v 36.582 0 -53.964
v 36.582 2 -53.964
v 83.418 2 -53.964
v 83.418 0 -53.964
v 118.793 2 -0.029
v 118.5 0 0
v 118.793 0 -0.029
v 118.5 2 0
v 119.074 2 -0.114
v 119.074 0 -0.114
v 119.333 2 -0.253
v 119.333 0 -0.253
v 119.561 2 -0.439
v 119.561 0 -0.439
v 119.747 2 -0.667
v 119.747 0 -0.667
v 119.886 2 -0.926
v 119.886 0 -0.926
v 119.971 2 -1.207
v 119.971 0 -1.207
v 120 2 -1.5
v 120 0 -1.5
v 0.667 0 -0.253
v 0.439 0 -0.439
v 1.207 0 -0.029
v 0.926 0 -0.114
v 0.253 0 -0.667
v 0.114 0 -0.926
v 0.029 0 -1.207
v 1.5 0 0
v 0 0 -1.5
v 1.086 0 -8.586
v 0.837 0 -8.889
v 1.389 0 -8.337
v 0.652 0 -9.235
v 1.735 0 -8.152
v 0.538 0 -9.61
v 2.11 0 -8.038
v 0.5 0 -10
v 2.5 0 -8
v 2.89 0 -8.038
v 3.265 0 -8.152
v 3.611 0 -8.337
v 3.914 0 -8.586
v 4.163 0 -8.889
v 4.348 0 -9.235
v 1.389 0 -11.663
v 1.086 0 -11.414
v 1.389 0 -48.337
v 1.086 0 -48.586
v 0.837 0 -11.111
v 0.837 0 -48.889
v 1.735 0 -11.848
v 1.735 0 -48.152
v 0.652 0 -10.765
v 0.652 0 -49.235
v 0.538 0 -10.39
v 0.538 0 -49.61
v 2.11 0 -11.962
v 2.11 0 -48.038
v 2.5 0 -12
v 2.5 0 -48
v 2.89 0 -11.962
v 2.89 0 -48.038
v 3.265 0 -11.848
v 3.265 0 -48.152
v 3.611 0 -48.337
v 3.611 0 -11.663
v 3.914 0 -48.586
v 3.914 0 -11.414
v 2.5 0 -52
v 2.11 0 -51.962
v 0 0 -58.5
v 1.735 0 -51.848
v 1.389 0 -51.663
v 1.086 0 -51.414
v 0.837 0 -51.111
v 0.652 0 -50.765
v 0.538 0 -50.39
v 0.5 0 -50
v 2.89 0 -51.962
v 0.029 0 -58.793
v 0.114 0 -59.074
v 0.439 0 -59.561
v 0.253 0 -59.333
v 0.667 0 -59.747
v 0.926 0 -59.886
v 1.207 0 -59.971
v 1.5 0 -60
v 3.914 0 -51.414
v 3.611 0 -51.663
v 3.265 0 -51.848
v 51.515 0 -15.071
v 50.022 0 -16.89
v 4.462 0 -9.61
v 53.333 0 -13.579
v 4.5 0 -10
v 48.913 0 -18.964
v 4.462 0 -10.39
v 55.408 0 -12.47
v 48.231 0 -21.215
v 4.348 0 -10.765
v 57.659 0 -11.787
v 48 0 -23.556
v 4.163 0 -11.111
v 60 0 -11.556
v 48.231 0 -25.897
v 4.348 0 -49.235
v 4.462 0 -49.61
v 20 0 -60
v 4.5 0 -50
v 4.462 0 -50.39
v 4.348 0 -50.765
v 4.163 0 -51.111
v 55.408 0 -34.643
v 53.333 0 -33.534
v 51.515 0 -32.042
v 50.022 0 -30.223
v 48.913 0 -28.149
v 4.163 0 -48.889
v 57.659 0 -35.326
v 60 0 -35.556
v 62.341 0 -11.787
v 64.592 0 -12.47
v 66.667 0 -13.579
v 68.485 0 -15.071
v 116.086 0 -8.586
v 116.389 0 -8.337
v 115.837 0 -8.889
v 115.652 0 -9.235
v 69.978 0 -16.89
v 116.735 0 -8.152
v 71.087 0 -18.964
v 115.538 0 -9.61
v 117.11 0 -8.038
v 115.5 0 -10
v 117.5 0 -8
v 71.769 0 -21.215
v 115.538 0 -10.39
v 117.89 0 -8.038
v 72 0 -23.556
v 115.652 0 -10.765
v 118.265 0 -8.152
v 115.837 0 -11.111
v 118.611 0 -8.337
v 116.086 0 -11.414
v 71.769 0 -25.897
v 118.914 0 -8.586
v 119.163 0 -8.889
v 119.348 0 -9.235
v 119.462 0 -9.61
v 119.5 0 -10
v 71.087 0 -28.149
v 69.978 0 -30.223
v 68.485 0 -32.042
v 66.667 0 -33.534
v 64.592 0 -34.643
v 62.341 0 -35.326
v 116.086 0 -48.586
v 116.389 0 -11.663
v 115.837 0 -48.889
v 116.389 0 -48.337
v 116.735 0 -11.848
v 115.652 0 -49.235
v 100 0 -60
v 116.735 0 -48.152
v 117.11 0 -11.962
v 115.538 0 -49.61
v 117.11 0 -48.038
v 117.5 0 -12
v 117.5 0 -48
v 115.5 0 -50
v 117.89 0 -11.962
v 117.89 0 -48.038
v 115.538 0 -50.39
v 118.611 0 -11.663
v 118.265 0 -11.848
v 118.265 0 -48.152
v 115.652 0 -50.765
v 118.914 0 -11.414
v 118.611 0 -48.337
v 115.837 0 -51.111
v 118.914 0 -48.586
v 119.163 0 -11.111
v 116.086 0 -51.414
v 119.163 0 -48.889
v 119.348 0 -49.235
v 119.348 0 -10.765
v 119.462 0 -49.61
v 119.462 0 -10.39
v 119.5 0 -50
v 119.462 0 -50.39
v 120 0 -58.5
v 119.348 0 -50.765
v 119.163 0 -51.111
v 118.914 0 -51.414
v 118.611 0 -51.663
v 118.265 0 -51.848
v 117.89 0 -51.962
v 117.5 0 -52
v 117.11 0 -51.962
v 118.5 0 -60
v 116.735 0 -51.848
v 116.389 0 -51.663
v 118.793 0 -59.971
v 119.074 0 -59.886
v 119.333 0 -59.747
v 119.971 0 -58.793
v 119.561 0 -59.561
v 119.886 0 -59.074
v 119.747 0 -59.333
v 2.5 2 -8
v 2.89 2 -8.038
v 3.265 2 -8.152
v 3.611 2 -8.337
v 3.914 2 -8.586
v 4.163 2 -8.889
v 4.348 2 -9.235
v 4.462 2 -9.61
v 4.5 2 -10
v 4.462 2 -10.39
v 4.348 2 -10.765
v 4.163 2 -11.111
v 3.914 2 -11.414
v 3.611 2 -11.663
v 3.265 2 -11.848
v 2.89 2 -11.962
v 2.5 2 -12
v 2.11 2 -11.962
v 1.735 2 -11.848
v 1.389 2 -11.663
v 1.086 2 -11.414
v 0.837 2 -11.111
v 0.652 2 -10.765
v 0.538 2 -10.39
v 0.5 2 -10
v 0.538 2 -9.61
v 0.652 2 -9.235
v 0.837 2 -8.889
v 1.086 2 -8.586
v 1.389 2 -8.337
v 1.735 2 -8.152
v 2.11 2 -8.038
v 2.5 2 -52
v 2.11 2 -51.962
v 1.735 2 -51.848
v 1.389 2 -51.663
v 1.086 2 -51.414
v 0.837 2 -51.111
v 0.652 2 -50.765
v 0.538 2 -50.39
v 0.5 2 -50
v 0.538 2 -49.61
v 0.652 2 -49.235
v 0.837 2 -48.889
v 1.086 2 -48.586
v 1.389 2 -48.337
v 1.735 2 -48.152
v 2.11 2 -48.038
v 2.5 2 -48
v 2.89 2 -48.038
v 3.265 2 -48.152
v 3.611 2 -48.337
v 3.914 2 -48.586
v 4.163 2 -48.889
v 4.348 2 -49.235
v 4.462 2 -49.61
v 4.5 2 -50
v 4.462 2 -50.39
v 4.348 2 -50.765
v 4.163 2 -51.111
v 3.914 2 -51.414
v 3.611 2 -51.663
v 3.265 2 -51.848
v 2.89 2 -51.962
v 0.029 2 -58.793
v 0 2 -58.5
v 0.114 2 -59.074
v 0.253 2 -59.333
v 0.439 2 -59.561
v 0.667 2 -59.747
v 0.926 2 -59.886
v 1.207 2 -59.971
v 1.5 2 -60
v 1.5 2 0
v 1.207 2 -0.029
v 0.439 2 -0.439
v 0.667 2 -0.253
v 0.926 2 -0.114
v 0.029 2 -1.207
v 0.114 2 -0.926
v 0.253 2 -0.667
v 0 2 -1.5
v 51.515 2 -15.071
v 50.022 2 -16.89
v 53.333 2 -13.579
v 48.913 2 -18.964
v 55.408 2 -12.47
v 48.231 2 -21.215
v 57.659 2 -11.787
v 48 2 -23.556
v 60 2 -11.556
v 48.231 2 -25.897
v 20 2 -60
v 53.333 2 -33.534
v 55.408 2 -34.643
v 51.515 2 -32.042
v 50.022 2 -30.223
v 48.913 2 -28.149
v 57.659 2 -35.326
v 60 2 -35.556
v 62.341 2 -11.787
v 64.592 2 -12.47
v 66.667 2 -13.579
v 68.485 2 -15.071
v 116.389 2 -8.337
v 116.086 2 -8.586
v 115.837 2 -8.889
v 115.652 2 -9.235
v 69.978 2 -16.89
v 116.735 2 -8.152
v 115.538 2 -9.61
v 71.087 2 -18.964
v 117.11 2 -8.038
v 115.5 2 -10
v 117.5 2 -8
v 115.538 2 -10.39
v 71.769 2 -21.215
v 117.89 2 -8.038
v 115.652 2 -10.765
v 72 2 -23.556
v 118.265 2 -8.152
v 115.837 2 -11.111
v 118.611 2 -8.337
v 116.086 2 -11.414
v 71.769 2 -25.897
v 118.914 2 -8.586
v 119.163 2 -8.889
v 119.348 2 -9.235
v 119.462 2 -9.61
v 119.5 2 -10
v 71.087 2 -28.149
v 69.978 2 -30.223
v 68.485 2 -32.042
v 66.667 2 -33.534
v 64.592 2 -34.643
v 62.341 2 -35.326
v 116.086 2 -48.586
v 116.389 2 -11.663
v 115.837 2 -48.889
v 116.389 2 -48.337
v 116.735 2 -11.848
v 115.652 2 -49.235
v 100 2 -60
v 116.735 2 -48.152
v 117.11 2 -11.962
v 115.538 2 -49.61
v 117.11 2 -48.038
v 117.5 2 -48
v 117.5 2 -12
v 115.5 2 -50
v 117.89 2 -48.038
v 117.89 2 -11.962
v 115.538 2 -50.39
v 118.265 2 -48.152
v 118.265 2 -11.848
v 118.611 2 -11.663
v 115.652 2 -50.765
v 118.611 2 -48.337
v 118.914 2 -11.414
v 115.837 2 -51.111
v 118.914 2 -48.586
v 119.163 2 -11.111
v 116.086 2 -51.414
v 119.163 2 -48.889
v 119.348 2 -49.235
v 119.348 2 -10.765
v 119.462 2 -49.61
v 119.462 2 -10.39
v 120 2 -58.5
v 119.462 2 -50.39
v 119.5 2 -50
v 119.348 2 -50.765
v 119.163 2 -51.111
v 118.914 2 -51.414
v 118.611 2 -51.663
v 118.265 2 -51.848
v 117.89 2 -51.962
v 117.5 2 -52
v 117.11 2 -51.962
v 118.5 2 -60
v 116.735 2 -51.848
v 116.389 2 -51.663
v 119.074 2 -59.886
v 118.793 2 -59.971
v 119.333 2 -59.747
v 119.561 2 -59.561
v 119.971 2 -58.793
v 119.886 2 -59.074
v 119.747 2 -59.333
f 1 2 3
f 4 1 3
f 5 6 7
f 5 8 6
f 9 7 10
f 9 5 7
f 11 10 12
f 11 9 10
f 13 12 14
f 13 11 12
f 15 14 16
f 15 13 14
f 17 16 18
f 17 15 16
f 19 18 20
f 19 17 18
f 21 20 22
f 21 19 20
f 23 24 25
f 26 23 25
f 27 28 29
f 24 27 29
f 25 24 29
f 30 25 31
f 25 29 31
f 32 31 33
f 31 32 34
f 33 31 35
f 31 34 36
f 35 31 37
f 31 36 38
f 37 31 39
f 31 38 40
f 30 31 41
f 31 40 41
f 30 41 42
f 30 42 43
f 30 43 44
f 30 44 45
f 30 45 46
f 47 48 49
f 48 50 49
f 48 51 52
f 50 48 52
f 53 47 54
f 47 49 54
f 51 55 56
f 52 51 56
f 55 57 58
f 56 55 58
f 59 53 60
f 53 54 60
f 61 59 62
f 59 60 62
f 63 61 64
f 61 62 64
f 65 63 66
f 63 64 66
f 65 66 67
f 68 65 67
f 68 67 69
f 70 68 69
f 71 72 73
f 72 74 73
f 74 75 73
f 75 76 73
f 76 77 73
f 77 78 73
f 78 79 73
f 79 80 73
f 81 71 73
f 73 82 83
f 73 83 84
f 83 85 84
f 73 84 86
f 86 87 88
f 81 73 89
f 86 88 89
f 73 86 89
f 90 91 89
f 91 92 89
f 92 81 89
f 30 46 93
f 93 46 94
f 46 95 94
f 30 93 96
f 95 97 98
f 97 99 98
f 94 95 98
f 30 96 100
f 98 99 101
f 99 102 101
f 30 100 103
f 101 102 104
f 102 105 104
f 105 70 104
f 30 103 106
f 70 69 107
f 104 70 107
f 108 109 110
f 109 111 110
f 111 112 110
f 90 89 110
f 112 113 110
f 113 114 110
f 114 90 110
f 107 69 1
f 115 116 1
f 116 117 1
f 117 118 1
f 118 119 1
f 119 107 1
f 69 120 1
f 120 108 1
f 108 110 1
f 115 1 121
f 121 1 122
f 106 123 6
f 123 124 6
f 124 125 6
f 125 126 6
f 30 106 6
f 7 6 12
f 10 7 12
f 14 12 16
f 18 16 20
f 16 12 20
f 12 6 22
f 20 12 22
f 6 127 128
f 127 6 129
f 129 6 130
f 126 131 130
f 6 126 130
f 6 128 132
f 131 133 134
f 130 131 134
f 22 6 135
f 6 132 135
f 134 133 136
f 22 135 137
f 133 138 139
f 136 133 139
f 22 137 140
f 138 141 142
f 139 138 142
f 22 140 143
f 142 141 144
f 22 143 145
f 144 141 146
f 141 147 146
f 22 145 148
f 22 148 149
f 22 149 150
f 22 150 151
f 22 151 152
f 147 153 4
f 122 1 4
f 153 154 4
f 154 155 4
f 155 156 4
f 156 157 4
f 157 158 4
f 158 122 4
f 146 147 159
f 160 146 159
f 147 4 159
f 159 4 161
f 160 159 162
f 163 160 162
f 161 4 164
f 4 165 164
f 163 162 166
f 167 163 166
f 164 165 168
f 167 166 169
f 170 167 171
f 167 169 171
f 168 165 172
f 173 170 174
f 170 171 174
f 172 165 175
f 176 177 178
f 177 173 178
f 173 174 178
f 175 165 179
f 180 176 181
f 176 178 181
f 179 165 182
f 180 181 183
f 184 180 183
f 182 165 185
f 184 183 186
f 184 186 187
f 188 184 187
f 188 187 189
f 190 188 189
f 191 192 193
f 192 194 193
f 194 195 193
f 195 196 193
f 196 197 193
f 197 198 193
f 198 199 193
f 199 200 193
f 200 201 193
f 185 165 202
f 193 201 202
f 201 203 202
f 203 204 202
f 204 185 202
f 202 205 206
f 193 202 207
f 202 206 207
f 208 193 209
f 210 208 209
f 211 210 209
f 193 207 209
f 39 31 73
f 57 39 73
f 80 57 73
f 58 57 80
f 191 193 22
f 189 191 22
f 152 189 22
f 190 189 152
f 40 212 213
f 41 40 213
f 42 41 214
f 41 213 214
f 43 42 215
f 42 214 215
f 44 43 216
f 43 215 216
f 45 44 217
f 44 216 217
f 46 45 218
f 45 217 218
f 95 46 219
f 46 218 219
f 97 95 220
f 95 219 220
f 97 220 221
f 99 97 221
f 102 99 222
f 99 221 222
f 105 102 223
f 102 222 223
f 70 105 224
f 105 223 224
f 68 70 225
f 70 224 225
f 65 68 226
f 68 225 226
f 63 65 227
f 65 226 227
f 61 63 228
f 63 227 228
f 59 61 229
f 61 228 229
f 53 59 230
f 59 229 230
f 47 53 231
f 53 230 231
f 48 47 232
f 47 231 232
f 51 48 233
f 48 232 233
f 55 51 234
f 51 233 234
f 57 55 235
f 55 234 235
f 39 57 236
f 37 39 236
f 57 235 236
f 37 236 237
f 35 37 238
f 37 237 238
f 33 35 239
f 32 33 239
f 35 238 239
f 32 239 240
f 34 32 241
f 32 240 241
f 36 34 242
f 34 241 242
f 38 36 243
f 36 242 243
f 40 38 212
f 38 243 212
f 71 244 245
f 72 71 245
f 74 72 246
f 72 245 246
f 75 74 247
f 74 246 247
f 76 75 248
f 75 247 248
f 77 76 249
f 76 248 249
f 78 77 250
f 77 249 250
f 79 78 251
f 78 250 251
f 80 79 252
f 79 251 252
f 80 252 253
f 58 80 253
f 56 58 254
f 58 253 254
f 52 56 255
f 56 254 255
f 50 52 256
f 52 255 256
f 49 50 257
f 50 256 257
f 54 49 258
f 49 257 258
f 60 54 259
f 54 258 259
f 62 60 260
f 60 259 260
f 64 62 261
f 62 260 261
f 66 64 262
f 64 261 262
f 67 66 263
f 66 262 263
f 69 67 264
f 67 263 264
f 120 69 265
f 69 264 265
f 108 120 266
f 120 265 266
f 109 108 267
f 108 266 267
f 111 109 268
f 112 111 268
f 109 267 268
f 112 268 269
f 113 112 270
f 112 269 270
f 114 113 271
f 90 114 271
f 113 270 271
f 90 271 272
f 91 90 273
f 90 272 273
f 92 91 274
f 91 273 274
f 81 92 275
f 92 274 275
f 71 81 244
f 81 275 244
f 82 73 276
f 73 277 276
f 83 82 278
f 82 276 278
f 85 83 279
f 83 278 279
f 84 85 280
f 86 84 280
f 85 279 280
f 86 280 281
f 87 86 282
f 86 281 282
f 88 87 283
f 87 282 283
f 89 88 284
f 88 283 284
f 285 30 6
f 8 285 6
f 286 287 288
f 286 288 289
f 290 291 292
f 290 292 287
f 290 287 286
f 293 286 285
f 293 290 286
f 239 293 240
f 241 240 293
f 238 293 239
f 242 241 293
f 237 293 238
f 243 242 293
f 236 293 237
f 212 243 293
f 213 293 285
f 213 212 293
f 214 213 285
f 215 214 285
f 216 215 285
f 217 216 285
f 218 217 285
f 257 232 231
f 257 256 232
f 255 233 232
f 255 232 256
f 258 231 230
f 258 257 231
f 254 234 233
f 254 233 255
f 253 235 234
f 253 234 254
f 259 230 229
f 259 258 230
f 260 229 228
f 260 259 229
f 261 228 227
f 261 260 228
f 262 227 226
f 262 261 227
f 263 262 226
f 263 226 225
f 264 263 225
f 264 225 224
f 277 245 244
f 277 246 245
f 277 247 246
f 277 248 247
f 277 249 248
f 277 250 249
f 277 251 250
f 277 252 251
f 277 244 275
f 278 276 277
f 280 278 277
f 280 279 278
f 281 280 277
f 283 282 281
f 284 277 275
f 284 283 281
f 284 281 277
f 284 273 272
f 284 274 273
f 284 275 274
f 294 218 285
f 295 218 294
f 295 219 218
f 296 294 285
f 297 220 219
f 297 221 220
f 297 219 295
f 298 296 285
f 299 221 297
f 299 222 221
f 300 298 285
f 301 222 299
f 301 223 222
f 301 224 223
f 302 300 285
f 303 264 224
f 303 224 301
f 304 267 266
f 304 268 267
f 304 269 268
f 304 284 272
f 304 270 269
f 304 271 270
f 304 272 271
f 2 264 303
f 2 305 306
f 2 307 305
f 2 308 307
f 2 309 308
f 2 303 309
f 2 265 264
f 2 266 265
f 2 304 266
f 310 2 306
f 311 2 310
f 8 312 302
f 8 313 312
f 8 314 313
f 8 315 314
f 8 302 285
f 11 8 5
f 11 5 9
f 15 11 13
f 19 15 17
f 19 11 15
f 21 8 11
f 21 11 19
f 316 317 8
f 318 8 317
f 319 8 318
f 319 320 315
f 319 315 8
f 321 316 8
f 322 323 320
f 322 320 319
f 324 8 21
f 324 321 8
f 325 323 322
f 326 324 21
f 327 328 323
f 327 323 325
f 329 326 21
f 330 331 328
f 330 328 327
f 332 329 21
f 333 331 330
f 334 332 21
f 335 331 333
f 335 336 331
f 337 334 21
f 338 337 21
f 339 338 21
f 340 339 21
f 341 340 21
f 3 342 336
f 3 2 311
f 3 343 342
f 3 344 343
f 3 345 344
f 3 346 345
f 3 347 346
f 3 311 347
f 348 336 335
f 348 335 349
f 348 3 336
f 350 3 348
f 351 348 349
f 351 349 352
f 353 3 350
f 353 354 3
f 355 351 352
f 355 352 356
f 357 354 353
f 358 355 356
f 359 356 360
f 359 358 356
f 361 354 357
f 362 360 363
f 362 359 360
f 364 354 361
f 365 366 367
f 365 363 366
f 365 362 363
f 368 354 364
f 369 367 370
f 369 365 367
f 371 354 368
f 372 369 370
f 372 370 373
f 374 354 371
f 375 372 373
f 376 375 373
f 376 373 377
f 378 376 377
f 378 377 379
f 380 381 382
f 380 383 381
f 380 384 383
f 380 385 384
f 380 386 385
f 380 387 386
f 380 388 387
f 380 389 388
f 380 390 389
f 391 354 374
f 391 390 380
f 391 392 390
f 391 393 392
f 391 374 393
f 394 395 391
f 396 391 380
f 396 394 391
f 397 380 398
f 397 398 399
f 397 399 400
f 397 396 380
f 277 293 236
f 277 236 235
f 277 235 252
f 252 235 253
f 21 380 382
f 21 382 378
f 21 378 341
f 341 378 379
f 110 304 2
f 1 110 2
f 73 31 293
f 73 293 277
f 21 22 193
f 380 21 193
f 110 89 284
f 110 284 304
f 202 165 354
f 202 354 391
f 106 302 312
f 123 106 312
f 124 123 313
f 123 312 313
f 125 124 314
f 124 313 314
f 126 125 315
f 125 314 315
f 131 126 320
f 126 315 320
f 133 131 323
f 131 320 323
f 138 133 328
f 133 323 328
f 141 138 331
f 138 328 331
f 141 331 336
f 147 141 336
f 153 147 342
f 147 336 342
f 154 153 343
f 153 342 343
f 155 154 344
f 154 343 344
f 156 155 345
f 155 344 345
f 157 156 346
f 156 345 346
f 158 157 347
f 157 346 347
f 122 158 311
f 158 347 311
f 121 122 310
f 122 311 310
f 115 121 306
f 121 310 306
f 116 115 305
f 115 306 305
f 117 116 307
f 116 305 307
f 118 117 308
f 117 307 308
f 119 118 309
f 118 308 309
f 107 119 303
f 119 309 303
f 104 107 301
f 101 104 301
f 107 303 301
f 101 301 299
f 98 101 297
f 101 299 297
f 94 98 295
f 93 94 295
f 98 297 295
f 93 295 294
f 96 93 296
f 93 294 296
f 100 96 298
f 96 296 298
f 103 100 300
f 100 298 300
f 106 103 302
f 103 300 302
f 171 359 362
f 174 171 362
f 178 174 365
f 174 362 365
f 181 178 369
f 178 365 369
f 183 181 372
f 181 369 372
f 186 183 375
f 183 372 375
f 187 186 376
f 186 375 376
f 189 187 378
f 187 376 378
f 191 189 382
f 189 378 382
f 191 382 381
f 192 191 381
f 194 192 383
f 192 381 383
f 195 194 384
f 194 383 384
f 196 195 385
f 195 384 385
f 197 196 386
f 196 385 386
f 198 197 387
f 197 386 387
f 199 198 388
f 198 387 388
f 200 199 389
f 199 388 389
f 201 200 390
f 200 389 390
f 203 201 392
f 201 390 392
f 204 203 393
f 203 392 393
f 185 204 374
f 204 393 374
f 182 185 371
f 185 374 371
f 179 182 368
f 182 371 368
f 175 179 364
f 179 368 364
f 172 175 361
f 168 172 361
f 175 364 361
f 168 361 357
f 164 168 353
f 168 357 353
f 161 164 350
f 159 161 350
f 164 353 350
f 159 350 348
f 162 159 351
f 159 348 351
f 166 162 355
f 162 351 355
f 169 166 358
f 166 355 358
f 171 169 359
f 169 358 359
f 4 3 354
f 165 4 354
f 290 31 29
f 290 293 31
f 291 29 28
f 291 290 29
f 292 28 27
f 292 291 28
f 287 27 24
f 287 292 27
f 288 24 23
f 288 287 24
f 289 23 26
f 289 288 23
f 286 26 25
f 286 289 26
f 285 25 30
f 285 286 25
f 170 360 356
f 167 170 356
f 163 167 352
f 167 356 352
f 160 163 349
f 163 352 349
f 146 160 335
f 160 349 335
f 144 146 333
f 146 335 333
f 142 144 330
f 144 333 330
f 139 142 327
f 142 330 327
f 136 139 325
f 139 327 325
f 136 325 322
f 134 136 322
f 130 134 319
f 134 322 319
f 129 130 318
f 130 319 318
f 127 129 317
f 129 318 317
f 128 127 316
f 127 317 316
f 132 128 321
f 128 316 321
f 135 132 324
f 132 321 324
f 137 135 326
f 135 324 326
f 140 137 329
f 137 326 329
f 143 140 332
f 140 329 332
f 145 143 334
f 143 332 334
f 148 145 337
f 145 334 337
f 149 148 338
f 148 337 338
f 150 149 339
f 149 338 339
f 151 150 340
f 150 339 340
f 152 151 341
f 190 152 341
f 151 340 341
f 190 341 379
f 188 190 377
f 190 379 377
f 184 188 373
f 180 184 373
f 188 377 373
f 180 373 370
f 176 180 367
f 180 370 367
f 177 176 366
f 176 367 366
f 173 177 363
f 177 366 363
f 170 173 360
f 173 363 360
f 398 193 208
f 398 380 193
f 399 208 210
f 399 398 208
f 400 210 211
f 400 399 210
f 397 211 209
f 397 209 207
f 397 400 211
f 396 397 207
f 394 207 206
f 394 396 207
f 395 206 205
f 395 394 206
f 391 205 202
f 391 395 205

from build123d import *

# Parameters (mm, degrees)
SKETCH_1_W          = 120
SKETCH_1_H          = 60
EXTRUDE_1_DEPTH     = 2
SKETCH_2_R          = 2
CUT_EXTRUDE_1_DEPTH = 2
SKETCH_3_R          = 12
CUT_EXTRUDE_2_DEPTH = 2
FILLET_1_R          = 1.5


with BuildPart() as part:
    # 草图1 → 凸台-拉伸1 (new body)
    with BuildSketch(Plane(origin=(0, 0, 0), x_dir=(1, 0, 0), z_dir=(0, 1, 0))):
        with Locations((60, 30)):
            Rectangle(SKETCH_1_W, SKETCH_1_H)
    extrude(amount=EXTRUDE_1_DEPTH)

    # 草图2 → 切除-拉伸1 (cut)
    with BuildSketch(Plane(origin=(0, 2, 0), x_dir=(1, 0, 0), z_dir=(0, 1, 0))):
        with Locations(Location((117.5, 50, 0), (0, 0, 270))):
            Circle(SKETCH_2_R)
        with Locations(Location((117.5, 10, 0), (0, 0, 90))):
            Circle(SKETCH_2_R)
        with Locations(Location((2.5, 50, 0), (0, 0, 90))):
            Circle(SKETCH_2_R)
        with Locations(Location((2.5, 10, 0), (0, 0, 270))):
            Circle(SKETCH_2_R)
    extrude(amount=-CUT_EXTRUDE_1_DEPTH, mode=Mode.SUBTRACT)

    # 草图3 → 切除-拉伸2 (cut)
    with BuildSketch(Plane(origin=(0, 2, 0), x_dir=(1, 0, 0), z_dir=(0, 1, 0))):
        with Locations(Location((60, 23.556349186, 0), (0, 0, 270))):
            Circle(SKETCH_3_R)
        Polygon((20, 60), (36.582438817, 53.964485859), (83.417561183, 53.964485859), (100, 60), align=None)
    extrude(amount=-CUT_EXTRUDE_2_DEPTH, mode=Mode.SUBTRACT)

    # 圆角1
    fillet_1_edges = [part.edges().sort_by_distance(p)[0] for p in [
        (0, 1, -60),
        (120, 1, -60),
        (120, 1, 0),
        (0, 1, 0),
    ]]
    fillet(fillet_1_edges, radius=FILLET_1_R)


solid = part.part
